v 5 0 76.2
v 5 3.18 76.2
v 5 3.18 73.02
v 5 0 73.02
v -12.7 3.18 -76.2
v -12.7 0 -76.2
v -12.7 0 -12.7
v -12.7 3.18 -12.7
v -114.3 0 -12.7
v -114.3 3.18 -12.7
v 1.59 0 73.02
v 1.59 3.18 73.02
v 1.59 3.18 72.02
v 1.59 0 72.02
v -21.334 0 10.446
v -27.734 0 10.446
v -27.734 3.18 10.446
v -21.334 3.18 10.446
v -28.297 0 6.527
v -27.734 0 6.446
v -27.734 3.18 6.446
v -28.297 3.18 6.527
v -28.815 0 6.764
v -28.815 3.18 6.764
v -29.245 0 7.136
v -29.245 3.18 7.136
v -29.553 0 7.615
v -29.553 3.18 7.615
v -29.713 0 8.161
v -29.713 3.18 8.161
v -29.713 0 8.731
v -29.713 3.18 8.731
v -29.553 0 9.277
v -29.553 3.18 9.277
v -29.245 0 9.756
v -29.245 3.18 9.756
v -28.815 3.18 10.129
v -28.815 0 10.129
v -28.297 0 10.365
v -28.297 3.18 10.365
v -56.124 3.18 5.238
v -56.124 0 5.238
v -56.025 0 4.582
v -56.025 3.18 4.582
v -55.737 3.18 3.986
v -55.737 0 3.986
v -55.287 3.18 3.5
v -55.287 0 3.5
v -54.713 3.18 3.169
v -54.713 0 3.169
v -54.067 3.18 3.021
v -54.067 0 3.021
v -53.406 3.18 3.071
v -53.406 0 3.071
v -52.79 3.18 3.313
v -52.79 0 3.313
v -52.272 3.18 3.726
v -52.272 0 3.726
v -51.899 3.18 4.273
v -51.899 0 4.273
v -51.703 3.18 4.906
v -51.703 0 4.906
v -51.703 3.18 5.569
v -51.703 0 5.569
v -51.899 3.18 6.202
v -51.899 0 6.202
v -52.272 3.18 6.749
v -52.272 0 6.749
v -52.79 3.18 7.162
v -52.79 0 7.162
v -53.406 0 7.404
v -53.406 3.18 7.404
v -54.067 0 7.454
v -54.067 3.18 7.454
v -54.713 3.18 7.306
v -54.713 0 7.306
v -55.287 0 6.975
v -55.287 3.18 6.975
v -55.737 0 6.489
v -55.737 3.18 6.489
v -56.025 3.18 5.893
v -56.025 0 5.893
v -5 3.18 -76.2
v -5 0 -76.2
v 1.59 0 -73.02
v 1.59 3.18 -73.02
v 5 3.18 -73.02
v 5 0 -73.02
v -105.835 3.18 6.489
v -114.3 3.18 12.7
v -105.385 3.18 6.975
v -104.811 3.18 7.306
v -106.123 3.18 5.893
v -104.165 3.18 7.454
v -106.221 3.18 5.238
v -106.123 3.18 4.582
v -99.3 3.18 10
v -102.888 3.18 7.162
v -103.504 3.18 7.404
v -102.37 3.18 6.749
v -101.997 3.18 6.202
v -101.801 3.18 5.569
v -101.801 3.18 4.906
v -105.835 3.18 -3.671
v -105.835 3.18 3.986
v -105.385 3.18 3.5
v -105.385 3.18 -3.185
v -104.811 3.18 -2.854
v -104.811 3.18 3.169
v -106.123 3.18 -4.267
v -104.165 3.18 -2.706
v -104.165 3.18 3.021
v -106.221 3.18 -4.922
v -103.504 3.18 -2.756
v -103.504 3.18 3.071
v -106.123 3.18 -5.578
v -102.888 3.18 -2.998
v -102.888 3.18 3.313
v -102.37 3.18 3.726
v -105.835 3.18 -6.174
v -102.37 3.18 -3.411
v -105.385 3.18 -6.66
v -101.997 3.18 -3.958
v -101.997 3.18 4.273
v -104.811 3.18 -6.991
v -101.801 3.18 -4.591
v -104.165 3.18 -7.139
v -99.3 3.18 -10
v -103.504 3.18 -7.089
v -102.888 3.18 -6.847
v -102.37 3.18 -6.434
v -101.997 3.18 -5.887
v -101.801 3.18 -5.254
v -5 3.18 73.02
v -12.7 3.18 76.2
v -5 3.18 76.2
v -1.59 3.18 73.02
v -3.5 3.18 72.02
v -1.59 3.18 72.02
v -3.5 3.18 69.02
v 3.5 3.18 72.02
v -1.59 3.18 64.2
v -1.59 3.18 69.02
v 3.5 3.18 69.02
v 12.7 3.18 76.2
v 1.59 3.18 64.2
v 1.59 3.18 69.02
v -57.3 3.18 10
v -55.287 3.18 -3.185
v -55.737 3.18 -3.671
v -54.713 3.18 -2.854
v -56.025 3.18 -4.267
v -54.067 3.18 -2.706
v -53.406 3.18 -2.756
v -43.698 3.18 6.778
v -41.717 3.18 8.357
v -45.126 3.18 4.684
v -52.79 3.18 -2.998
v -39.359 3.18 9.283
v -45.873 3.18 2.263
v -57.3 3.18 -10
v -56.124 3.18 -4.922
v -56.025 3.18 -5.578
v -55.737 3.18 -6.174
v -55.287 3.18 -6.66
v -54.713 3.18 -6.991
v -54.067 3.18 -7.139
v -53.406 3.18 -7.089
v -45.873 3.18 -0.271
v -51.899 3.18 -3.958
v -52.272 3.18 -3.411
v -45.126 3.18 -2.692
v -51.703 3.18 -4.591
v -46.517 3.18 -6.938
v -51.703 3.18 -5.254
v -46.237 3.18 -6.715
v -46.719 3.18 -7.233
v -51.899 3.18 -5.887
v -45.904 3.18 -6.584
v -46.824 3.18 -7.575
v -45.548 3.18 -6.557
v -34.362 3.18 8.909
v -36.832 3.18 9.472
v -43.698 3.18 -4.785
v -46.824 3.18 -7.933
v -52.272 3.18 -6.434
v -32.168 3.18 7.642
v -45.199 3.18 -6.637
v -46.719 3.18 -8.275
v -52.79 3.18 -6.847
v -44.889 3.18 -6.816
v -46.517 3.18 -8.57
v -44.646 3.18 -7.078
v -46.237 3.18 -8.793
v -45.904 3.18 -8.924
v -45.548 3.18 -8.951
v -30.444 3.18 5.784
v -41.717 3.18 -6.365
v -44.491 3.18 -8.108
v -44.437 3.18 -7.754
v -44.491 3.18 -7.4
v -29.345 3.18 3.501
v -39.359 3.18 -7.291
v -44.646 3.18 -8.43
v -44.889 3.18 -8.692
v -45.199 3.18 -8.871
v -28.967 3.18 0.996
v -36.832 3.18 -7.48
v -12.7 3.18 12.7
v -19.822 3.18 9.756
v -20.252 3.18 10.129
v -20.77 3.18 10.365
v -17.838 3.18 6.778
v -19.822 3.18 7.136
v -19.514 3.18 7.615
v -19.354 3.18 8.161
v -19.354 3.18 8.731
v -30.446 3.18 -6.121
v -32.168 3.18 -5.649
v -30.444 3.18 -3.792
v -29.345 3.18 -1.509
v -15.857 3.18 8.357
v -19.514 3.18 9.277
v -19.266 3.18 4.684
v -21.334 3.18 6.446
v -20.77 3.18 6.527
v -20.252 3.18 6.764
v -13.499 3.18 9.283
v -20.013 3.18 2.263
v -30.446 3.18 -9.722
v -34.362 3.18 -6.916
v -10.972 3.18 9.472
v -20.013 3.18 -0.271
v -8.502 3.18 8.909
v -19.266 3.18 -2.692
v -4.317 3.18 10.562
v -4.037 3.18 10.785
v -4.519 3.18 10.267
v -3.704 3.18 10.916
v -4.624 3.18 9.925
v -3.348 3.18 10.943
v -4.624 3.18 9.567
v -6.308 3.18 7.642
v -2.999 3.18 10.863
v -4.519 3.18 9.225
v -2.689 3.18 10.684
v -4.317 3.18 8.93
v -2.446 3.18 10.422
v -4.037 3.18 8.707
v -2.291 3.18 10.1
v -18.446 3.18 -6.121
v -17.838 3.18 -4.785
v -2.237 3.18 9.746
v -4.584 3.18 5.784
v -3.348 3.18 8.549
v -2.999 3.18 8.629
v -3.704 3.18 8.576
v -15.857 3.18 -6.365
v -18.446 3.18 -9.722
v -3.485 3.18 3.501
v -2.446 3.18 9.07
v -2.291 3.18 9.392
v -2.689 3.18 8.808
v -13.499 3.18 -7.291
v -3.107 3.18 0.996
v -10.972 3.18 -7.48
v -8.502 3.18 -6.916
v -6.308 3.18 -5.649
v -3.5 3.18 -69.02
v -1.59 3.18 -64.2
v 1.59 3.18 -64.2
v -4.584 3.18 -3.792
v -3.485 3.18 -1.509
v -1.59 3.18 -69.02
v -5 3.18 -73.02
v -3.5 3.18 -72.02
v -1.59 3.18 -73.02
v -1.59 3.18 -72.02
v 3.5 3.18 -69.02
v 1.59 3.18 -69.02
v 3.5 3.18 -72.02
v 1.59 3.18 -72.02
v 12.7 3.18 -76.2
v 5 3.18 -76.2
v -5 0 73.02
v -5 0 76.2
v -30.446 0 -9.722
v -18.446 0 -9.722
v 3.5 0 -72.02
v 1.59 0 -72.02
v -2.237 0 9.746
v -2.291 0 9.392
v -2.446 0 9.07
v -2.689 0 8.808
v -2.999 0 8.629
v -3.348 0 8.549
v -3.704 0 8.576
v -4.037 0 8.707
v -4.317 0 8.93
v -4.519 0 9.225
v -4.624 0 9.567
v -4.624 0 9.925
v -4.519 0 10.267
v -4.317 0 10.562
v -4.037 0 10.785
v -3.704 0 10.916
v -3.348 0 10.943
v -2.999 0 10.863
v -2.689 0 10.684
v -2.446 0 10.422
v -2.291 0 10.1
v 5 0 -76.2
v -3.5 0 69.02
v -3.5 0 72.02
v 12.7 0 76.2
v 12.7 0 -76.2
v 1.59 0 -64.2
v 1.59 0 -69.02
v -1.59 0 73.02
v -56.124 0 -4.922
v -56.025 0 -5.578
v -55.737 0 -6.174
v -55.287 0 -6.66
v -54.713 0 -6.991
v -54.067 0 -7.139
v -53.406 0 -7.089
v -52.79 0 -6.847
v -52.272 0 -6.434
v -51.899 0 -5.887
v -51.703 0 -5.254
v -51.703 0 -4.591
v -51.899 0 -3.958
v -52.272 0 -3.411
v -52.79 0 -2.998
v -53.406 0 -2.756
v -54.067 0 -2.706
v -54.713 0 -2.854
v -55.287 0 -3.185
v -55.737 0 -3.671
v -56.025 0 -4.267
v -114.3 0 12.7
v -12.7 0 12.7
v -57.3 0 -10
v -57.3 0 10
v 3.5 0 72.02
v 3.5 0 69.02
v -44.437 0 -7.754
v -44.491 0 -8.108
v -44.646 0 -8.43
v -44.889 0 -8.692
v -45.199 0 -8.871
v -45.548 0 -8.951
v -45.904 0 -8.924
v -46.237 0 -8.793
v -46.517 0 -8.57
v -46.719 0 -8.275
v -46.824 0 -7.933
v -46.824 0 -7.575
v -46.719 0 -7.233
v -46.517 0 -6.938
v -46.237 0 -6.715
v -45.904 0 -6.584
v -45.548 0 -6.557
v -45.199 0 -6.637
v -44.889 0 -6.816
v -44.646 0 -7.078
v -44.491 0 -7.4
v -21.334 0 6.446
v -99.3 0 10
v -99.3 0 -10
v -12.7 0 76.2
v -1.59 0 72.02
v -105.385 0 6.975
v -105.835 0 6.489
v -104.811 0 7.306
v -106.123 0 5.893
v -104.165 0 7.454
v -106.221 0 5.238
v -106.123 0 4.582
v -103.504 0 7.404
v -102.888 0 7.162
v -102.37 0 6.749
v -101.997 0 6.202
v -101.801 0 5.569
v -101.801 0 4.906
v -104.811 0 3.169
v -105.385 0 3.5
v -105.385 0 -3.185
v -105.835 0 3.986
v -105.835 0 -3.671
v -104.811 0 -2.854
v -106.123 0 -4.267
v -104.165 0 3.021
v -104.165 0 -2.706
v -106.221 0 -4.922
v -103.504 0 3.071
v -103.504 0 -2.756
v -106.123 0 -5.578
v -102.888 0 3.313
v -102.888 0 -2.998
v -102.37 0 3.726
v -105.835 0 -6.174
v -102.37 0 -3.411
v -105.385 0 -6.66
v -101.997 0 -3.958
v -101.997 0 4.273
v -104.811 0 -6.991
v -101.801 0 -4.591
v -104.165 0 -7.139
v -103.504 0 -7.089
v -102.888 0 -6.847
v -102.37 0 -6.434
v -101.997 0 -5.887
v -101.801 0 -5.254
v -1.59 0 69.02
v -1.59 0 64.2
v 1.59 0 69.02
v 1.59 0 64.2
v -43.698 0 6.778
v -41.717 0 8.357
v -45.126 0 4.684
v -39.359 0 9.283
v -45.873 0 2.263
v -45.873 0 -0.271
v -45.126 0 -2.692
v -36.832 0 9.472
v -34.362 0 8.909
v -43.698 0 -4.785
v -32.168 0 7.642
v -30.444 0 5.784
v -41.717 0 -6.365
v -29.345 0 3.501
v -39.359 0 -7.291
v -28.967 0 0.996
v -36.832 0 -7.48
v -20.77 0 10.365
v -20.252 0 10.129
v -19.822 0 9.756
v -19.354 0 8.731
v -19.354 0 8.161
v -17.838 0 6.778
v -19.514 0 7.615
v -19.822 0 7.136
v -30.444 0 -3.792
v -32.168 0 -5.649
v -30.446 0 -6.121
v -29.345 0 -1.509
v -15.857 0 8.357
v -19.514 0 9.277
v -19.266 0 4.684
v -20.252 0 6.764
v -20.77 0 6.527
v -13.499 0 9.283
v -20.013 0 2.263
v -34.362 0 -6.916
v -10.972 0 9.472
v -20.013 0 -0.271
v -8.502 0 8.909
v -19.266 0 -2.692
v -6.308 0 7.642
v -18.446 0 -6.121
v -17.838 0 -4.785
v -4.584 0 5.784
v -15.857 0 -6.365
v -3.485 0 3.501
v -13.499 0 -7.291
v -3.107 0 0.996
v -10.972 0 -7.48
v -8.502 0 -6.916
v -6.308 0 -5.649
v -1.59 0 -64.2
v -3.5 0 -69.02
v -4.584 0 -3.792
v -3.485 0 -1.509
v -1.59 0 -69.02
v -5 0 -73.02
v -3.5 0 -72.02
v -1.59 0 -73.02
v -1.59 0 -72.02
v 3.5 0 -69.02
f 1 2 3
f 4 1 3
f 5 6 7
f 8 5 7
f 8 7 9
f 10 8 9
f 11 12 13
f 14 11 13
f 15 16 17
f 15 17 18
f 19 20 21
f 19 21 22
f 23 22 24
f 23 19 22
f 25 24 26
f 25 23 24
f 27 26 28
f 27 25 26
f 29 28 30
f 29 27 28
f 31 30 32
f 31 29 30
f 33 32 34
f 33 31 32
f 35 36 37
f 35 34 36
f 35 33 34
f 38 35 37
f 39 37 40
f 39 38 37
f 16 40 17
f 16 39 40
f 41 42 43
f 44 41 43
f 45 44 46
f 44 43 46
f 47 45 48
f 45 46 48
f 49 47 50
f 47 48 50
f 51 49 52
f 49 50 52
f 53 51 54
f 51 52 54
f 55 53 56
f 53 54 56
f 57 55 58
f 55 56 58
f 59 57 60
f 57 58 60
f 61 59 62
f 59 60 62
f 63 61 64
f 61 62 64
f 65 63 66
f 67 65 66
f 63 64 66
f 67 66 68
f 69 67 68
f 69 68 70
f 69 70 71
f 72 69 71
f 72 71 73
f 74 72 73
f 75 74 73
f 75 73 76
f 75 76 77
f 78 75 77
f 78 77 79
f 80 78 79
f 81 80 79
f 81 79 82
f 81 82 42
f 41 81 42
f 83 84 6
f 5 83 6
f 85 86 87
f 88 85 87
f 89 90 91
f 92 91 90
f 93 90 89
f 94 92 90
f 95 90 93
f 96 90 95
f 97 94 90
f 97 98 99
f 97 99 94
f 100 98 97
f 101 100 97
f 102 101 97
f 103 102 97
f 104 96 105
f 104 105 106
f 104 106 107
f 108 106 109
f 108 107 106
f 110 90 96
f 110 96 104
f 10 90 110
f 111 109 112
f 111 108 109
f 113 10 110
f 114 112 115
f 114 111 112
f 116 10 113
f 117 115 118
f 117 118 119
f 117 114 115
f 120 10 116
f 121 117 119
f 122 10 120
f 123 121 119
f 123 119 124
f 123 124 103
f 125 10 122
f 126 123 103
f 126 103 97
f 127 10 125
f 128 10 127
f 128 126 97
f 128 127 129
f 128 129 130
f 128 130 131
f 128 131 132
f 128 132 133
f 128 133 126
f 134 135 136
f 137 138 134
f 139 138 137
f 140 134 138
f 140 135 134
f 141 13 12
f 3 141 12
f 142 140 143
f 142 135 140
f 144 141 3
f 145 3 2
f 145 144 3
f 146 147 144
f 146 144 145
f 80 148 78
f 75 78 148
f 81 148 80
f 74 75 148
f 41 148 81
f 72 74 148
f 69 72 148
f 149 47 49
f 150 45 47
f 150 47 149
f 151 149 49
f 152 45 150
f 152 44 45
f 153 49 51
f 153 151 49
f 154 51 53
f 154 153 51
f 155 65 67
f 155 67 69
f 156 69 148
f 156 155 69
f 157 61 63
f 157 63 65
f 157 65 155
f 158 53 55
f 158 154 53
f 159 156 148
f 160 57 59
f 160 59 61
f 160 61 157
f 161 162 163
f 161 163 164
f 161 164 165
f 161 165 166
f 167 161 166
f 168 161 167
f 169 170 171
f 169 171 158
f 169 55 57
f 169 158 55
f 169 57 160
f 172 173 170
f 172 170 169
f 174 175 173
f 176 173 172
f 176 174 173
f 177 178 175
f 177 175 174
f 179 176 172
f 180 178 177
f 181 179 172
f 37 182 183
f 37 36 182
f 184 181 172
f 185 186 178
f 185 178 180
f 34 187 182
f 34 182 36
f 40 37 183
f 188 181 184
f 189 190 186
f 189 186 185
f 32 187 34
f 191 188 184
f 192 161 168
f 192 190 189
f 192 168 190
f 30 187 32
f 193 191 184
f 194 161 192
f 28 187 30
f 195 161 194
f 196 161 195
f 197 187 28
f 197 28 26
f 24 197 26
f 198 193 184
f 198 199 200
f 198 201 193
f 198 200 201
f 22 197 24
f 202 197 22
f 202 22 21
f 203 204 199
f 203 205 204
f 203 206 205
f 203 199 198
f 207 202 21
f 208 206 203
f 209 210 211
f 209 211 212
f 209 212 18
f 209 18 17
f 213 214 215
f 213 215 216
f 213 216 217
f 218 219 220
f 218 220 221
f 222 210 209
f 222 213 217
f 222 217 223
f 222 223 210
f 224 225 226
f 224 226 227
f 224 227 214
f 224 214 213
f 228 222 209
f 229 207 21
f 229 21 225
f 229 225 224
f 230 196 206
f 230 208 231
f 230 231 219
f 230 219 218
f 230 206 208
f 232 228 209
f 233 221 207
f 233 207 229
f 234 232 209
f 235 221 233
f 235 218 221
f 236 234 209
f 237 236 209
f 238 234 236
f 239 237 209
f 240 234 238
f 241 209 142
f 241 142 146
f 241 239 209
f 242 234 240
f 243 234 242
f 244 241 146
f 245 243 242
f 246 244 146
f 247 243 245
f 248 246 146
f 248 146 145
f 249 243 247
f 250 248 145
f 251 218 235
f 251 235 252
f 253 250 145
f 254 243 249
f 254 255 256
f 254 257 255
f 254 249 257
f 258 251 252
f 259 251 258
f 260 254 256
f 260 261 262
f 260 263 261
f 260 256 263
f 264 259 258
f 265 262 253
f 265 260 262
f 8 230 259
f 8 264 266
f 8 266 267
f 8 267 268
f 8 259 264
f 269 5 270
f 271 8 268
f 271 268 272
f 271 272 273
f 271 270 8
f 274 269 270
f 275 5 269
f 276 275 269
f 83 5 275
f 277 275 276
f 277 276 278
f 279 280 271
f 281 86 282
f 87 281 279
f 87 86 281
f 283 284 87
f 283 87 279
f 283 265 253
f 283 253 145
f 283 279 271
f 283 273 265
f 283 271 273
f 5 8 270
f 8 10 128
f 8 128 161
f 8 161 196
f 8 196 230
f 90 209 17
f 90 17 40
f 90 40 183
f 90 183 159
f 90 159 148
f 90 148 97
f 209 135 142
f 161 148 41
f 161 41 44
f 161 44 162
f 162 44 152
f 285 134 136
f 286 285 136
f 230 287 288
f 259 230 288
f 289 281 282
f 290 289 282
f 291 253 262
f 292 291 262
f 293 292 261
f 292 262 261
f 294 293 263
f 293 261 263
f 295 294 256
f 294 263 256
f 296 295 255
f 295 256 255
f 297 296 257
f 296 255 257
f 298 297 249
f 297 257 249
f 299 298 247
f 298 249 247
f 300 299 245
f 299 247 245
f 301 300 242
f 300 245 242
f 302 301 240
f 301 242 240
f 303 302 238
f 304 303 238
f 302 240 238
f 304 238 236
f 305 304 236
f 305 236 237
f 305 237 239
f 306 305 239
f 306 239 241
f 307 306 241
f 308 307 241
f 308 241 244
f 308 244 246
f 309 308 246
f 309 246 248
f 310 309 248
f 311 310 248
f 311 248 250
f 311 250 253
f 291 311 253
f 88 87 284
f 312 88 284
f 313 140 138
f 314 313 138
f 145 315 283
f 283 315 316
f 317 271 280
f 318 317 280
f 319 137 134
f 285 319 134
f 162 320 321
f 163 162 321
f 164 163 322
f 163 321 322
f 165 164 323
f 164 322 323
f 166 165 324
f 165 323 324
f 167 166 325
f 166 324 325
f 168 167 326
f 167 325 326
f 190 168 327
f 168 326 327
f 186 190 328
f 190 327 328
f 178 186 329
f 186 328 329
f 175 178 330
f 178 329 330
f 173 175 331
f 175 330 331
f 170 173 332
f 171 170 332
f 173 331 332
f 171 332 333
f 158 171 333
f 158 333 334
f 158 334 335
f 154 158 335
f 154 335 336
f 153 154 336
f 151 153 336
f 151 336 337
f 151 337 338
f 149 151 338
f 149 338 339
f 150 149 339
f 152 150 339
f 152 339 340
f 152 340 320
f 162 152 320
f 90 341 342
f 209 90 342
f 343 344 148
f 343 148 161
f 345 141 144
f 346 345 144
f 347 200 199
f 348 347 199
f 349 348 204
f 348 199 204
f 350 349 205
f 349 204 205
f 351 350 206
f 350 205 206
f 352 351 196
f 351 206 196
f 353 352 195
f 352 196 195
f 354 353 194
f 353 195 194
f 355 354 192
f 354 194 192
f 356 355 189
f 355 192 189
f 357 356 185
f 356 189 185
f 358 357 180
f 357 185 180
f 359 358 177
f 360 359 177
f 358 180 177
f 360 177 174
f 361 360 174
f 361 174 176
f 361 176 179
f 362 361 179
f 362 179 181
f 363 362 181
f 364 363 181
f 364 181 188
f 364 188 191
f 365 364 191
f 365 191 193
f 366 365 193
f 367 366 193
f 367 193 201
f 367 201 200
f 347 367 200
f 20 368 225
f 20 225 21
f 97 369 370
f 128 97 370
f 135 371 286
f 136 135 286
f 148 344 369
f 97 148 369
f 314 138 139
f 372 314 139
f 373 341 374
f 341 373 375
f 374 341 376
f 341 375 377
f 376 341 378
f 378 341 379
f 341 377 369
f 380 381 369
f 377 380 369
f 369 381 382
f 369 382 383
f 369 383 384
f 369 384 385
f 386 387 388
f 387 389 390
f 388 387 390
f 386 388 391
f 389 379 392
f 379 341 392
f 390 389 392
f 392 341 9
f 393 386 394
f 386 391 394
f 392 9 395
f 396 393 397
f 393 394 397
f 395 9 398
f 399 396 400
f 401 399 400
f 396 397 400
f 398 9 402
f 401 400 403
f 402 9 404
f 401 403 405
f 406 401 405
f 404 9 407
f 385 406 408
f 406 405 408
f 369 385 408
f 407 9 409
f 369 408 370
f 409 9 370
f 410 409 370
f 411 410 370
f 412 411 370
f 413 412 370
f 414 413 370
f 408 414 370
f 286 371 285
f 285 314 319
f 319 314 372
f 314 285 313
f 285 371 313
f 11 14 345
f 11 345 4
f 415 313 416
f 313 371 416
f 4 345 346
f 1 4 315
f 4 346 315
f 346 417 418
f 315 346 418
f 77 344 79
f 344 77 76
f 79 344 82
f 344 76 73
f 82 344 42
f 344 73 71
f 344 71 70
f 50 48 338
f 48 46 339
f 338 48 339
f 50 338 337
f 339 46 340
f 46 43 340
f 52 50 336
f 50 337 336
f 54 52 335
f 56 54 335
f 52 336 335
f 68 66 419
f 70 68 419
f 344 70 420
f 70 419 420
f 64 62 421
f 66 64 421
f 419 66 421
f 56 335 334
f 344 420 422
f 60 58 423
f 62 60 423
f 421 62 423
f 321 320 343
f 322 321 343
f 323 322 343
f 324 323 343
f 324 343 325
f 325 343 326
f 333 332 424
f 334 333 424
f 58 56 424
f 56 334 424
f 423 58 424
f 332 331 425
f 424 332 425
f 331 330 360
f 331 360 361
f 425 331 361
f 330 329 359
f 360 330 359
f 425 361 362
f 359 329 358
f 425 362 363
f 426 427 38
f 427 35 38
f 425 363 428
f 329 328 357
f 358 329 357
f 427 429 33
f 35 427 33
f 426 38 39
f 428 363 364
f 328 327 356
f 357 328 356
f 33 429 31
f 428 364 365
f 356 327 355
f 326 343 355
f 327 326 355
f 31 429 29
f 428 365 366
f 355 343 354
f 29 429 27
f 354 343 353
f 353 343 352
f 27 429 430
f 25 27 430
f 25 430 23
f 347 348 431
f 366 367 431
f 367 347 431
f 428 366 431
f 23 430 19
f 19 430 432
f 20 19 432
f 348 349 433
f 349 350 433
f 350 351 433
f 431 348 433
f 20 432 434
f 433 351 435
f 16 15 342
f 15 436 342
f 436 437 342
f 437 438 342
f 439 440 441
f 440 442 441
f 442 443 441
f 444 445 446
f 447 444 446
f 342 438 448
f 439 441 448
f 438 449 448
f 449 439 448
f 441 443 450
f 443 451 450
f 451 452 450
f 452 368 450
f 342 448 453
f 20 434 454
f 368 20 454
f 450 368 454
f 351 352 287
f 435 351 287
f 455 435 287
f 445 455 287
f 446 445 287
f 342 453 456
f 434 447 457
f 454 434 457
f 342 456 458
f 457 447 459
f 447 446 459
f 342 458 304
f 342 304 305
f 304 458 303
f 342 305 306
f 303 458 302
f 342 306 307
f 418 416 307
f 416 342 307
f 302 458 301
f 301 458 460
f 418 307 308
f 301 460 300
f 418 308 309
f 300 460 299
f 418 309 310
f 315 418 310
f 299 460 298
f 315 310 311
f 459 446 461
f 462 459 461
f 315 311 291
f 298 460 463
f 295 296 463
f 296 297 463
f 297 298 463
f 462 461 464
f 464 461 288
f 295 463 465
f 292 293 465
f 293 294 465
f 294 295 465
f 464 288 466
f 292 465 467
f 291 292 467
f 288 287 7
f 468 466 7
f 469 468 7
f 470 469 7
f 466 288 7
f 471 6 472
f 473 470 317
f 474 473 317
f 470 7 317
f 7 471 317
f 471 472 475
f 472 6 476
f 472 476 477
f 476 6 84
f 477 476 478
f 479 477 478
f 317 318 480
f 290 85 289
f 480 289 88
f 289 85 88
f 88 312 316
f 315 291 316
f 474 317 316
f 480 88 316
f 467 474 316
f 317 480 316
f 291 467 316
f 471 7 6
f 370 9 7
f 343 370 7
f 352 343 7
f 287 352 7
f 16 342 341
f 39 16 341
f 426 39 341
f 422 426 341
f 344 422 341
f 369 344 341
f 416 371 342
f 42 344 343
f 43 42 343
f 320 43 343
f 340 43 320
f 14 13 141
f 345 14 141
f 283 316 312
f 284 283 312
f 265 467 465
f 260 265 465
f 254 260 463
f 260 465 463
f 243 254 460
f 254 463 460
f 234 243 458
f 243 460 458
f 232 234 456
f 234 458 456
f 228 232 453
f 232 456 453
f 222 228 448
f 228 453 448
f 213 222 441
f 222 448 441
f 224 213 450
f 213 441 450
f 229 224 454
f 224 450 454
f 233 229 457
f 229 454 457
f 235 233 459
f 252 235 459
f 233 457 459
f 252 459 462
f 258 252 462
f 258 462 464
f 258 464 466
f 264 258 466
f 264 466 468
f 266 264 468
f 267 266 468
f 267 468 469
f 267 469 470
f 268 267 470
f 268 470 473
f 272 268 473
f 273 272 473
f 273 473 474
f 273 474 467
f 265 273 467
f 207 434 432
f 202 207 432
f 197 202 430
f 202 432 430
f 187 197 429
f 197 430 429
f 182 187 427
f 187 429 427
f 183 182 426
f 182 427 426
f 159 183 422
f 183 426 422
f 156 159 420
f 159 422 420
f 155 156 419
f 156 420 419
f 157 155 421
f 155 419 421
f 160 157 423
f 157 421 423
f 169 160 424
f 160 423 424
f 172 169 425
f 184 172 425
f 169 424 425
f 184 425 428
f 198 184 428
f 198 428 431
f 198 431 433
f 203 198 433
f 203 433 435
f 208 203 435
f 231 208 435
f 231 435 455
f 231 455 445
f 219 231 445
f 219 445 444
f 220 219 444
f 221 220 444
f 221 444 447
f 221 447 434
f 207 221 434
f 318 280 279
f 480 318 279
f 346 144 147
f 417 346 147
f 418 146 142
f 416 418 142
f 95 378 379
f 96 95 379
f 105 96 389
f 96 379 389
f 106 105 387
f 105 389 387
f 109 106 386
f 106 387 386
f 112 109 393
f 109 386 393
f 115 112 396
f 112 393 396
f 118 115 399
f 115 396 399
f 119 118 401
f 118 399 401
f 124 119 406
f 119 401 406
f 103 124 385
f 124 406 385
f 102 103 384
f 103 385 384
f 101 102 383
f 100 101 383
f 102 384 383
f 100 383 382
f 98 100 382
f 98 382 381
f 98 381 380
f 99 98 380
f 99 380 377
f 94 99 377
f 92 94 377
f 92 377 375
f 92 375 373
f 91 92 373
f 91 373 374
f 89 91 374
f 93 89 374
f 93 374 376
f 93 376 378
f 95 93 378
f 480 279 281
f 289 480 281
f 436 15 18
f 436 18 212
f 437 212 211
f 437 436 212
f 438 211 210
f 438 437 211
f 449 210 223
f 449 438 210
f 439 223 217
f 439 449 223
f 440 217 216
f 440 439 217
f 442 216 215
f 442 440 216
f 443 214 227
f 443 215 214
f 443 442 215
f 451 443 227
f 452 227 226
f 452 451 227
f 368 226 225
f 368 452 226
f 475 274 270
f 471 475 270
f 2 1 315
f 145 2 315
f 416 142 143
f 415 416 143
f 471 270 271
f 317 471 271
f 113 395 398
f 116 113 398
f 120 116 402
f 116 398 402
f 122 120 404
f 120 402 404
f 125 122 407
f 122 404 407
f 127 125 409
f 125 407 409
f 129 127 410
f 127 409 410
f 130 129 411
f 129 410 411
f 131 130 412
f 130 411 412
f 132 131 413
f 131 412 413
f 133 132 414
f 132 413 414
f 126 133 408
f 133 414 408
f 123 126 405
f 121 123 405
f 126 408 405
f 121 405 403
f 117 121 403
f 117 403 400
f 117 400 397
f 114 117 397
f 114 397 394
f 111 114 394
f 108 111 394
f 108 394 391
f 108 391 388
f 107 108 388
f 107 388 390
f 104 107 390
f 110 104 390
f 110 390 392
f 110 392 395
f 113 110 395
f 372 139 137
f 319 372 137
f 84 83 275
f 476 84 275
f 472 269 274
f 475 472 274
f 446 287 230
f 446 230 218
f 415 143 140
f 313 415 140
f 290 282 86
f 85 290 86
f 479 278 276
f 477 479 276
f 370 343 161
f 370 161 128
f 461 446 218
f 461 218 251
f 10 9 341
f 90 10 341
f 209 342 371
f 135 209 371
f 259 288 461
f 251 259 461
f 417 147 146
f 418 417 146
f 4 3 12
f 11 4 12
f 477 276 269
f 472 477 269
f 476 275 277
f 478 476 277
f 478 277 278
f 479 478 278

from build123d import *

# Parameters (mm, degrees)
BOSS_EXTRUDE1_DEPTH = 3.18
CUT_EXTRUDE1_DEPTH  = 3.18
SKETCH3_W           = 42
SKETCH3_H           = 20
CUT_EXTRUDE2_DEPTH  = 10
SKETCH4_R           = 2.2225
CUT_EXTRUDE3_DEPTH  = 10
SKETCH5_R           = 8.5
SKETCH5_W           = 12
SKETCH5_H           = 3.600941215
CUT_EXTRUDE4_DEPTH  = 10
SKETCH6_R           = 1.2
CUT_EXTRUDE5_DEPTH  = 10


with BuildPart() as part:
    # Sketch1 → Boss-Extrude1 (new body)
    with BuildSketch(Plane(origin=(0, 0, 0), x_dir=(1, 0, 0), z_dir=(0, 1, 0))):
        Polygon((12.7, 76.2), (-12.7, 76.2), (-12.7, 12.7), (-114.3, 12.7), (-114.3, -12.7), (-12.7, -12.7), (-12.7, -76.2), (12.7, -76.2), align=None)
    extrude(amount=BOSS_EXTRUDE1_DEPTH)

    # Sketch2 → Cut-Extrude1 (cut)
    with BuildSketch(Plane(origin=(0, 3.18, 0), x_dir=(1, 0, 0), z_dir=(0, 1, 0))):
        Polygon((-1.59, 73.02), (-1.59, 72.02), (-3.5, 72.02), (-3.5, 69.02), (-1.59, 69.02), (-1.59, 64.2), (1.59, 64.2), (1.59, 69.02), (3.5, 69.02), (3.5, 72.02), (1.59, 72.02), (1.59, 73.02), (5, 73.02), (5, 76.2), (-5, 76.2), (-5, 73.02), align=None)
        Polygon((1.59, -72.02), (3.5, -72.02), (3.5, -69.02), (1.59, -69.02), (1.59, -64.2), (-1.59, -64.2), (-1.59, -69.02), (-3.5, -69.02), (-3.5, -72.02), (-1.59, -72.02), (-1.59, -73.02), (-5, -73.02), (-5, -76.2), (5, -76.2), (5, -73.02), (1.59, -73.02), align=None)
    extrude(amount=-CUT_EXTRUDE1_DEPTH, mode=Mode.SUBTRACT)

    # Sketch3 → Cut-Extrude2 (cut)
    with BuildSketch(Plane(origin=(0, 0, 0), x_dir=(-1, 0, 0), z_dir=(0, -1, 0))):
        with Locations((78.3, 0)):
            Rectangle(SKETCH3_W, SKETCH3_H)
    extrude(amount=-CUT_EXTRUDE2_DEPTH, mode=Mode.SUBTRACT)

    # Sketch4 → Cut-Extrude3 (cut)
    with BuildSketch(Plane(origin=(0, 0, 0), x_dir=(-1, 0, 0), z_dir=(0, -1, 0))):
        with Locations((103.999, -5.2375)):
            Circle(SKETCH4_R)
        with Locations((103.999, 4.9225)):
            Circle(SKETCH4_R)
        with Locations((53.901, 4.9225)):
            Circle(SKETCH4_R)
        with Locations((53.901, -5.2375)):
            Circle(SKETCH4_R)
    extrude(amount=-CUT_EXTRUDE3_DEPTH, mode=Mode.SUBTRACT)

    # Sketch5 → Cut-Extrude4 (cut)
    with BuildSketch(Plane.XZ):
        with Locations((-37.467456586, 0.996077317)):
            Circle(SKETCH5_R)
        with Locations((-11.607456586, 0.996077317)):
            Circle(SKETCH5_R)
        with BuildLine():
            Line((-27.73362836, 10.446077317), (-21.33362836, 10.446077317))
            ThreePointArc((-21.33362836, 10.446077317), (-19.33362836, 8.446077317), (-21.33362836, 6.446077317))
            Line((-21.33362836, 6.446077317), (-27.73362836, 6.446077317))
            ThreePointArc((-27.73362836, 6.446077317), (-29.73362836, 8.446077317), (-27.73362836, 10.446077317))
        make_face()
        with Locations((-24.446347452, -7.921372698)):
            Rectangle(SKETCH5_W, SKETCH5_H)
    extrude(amount=-CUT_EXTRUDE4_DEPTH, mode=Mode.SUBTRACT)

    # Sketch6 → Cut-Extrude5 (cut)
    with BuildSketch(Plane(origin=(0, 3.18, 0), x_dir=(1, 0, 0), z_dir=(0, 1, 0))):
        with Locations((-3.437456586, -9.746077317)):
            Circle(SKETCH6_R)
        with Locations((-45.637456586, 7.753922683)):
            Circle(SKETCH6_R)
    extrude(amount=-CUT_EXTRUDE5_DEPTH, mode=Mode.SUBTRACT)


solid = part.part
